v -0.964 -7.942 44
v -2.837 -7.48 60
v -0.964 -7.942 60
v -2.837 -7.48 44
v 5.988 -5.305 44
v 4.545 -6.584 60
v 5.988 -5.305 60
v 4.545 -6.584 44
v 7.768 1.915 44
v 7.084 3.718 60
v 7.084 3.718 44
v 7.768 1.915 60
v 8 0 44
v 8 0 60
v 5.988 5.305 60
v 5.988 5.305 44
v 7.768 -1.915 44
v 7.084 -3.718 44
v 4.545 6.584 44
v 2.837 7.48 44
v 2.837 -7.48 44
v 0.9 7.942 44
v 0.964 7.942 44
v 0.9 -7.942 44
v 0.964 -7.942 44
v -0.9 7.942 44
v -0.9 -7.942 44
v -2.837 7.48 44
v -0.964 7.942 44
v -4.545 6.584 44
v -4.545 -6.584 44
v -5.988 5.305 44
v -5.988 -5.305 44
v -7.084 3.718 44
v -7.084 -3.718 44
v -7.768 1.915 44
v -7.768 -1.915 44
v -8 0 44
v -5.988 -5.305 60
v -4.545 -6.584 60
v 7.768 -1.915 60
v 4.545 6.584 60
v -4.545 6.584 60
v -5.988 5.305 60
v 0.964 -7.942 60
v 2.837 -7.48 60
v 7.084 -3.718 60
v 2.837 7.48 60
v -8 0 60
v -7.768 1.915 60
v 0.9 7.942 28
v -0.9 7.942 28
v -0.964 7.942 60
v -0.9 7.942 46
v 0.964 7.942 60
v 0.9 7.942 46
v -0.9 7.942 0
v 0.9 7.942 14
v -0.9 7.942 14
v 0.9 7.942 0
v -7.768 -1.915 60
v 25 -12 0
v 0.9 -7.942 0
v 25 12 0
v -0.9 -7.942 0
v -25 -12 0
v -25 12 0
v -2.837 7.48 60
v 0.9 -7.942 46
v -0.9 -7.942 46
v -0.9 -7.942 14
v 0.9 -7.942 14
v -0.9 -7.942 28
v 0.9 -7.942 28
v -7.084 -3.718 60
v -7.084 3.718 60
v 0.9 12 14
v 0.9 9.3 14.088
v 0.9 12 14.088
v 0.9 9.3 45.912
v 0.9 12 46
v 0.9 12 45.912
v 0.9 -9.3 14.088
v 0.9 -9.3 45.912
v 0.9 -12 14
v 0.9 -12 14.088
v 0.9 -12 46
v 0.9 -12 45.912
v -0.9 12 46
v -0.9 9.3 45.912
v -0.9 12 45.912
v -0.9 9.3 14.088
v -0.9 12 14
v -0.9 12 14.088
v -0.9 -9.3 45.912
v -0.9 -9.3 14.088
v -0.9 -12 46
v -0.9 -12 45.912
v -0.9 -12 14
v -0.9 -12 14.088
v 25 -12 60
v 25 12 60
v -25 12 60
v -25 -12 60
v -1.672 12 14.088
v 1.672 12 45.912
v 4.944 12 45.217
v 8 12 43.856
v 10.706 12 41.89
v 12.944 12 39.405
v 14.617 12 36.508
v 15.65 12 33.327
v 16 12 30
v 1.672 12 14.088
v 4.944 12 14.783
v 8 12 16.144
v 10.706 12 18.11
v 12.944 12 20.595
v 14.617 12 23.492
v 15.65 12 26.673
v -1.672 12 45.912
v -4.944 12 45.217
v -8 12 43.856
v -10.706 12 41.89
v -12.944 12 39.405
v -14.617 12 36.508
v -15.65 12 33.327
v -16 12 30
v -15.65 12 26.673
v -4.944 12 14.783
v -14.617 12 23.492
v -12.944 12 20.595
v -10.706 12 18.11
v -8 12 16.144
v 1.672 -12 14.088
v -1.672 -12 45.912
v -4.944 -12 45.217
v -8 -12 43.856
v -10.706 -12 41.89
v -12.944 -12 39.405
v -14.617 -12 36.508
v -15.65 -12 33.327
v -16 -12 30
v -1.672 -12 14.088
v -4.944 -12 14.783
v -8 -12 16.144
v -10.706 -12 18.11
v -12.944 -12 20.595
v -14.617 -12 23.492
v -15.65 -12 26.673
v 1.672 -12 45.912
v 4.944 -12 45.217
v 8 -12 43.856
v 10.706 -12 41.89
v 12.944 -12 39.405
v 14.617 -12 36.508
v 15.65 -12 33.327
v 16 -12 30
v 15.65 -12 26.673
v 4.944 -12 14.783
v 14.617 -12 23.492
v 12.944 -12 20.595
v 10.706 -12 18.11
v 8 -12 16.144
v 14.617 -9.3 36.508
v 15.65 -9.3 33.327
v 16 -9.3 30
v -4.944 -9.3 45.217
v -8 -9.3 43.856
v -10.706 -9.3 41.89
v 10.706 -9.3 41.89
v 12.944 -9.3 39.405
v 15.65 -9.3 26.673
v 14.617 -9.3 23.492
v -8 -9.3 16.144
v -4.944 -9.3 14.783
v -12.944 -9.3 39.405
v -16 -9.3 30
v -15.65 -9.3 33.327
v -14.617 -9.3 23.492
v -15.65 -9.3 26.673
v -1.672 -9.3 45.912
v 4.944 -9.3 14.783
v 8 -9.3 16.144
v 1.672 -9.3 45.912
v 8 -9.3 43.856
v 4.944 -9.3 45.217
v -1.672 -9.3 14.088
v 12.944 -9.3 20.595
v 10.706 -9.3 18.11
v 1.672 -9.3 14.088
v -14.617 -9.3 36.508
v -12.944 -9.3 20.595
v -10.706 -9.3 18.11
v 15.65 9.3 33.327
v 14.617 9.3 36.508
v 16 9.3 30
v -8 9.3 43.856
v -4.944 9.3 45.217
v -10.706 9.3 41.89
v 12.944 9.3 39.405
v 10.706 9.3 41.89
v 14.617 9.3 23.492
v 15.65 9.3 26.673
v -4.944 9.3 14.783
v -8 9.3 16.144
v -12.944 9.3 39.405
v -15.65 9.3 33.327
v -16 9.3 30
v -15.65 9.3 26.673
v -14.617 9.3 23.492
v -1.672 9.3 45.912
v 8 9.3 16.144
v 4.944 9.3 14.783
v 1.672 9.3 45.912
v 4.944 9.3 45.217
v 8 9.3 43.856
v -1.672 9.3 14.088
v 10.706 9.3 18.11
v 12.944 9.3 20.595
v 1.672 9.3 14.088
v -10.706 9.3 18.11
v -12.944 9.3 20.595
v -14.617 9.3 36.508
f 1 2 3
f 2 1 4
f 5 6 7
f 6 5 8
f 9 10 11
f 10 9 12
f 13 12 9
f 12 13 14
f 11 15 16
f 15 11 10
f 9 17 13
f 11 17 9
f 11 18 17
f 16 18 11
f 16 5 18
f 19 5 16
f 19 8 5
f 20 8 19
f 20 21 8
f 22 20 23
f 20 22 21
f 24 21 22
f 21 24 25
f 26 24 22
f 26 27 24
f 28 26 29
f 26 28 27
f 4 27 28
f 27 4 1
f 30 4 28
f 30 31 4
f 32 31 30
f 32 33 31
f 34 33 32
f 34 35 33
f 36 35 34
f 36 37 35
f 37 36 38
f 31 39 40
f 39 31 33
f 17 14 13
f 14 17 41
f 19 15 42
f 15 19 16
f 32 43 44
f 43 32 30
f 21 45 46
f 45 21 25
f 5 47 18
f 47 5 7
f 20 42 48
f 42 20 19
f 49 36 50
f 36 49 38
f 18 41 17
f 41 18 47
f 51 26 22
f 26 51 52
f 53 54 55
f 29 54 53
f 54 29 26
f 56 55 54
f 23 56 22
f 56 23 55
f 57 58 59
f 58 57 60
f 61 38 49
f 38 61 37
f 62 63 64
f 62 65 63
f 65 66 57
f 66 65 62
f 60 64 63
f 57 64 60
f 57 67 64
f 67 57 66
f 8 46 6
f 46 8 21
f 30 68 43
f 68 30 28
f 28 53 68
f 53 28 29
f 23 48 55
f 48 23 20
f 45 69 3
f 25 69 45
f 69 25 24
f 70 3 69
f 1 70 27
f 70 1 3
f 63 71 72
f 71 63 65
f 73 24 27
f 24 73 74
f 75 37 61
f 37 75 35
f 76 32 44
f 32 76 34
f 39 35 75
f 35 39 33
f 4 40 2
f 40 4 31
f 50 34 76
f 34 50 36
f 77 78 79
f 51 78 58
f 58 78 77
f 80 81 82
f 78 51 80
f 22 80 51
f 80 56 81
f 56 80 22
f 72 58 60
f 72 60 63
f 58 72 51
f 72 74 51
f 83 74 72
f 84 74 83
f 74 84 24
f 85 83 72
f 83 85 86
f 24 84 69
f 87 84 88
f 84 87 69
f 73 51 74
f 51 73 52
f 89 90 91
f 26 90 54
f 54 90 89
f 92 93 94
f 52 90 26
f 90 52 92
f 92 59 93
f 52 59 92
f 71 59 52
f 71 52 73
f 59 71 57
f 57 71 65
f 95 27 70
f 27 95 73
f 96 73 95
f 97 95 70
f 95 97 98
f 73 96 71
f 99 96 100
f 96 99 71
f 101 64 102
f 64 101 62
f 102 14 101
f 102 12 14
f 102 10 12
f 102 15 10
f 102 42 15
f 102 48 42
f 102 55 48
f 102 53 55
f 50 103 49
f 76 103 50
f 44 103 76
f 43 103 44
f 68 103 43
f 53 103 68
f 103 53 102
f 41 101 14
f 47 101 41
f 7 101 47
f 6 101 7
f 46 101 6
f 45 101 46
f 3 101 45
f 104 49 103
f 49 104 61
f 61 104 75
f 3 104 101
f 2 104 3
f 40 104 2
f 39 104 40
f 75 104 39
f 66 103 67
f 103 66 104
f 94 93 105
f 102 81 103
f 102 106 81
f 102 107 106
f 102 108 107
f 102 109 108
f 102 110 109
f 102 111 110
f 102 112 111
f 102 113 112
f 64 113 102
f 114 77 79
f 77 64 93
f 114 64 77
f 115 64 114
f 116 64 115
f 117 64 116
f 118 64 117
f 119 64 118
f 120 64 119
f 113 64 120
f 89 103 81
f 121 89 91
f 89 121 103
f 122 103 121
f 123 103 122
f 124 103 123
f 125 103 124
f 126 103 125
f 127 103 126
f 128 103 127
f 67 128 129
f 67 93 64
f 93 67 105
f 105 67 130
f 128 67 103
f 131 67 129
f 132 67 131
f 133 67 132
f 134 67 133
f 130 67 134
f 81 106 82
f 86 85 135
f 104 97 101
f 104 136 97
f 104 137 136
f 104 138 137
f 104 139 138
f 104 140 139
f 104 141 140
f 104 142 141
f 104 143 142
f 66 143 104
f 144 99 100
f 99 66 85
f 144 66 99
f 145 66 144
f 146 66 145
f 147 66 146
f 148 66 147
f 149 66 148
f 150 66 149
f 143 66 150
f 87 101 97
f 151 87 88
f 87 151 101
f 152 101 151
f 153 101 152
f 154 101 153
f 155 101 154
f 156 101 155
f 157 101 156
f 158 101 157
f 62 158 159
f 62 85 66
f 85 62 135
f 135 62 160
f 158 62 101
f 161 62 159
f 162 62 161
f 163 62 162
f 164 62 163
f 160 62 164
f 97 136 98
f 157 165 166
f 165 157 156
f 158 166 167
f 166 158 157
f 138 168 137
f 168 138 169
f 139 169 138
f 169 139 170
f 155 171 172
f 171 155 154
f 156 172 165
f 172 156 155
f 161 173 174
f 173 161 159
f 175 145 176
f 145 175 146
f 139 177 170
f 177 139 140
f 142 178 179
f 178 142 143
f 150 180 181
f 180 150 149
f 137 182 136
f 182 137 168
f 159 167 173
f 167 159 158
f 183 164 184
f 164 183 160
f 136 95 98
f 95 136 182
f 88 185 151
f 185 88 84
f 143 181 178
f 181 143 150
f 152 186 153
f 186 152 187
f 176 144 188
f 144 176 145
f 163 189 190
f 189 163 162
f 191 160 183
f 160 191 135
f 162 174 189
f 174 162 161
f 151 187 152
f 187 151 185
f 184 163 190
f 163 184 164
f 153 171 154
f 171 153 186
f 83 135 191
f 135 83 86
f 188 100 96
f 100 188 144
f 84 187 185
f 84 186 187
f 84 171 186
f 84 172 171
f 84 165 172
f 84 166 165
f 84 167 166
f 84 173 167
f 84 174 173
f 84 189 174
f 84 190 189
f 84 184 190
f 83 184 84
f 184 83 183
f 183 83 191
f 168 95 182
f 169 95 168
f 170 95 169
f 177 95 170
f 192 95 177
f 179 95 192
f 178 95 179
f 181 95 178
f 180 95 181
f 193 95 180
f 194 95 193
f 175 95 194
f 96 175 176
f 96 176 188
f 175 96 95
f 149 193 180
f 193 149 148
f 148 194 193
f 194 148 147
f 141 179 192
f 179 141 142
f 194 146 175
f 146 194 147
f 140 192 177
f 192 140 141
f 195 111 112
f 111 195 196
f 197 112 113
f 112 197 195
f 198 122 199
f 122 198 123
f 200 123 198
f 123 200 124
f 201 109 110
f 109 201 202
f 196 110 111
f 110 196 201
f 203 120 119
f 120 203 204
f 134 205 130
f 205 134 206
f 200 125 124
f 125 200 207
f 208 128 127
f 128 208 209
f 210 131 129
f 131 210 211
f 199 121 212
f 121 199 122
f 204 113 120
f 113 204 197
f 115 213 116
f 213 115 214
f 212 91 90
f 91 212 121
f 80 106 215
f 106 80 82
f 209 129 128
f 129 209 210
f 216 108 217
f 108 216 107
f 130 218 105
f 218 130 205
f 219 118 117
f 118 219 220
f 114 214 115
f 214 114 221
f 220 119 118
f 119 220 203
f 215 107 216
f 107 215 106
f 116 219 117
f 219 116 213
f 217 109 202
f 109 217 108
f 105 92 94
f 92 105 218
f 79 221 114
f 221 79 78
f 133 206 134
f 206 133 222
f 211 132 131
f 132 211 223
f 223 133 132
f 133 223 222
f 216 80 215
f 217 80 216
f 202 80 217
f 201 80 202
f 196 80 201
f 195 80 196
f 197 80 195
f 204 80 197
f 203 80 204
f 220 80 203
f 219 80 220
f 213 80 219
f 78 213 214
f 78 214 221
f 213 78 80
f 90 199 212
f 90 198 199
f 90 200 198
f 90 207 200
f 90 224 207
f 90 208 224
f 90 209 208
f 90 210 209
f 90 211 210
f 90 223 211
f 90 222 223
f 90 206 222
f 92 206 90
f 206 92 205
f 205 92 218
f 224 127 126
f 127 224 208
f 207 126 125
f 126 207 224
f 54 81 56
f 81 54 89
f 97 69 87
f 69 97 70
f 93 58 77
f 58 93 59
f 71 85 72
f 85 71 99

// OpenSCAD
/**************************************************
 *             MARBLE PUMP GENERATOR              *
 * a simples Generator to gernerate marble pumps  *
 *                                                *
 *  created by cyberkeiler  (terramultimedia.de)  *
 **************************************************/

/**************************************************
 *            All Settings are below              *
 vvvvvvvvvvvvvvvvvvvvvvvvvvvvvvvvvvvvvvvvvvvvvvvvv*/

// Marble Setup
marble_dia = 16; // The Diameter of your Marbles

//Marble Pump Setup
marblepump_height = 60;
marblepump_shaft_rad = 16;
marblepump_shaft_dia = 1.8;

/* ^^^^^^^^^^^^^^^^^^^^^^^^^^^^^^^^^^^^^^^^^^^^^^ *
 *            All Settings are above              *
 **************************************************
 *      EVERYTHING BELOW IS INTERNAL LOGIC!       *
 * DON'T WORRY ABOUT IT ;) ONLY CHANGE THE ABOVE! *
 **************************************************/


// Piston
color([0,0,1,1])
  MarblePumpPiston();

// Piston Block
color([1,0.3,0,.6])
  MarblePump(_length = 50);

module MarblePumpPiston( h = marblepump_height){
  difference(){
    cylinder(r = marble_dia/2, h = ( h - marble_dia));
    translate([0,0,(h - marble_dia*2)/2])
    cube([marblepump_shaft_dia, marble_dia, h - marble_dia*2], center=true);
  }
}

module MarblePump(_width = marble_dia*1.5, _length, _height = marblepump_height){

  translate([0, 0, marblepump_height/2])
    difference(){
      cube([_length, _width, _height], center = true);
      cylinder(r = marble_dia/2, h = _height*1.5, center=true);
      translate([0,-(_width/2 - marblepump_shaft_dia*0.5),0])
        rotate([90,0,0])
          cylinder(r = marblepump_shaft_rad, h=marblepump_shaft_dia*2, center=true);
      translate([0,(_width/2 - marblepump_shaft_dia*0.5),0])
        rotate([90,0,0])
          cylinder(r = marblepump_shaft_rad, h=marblepump_shaft_dia*2, center=true);
      cube([marblepump_shaft_dia, _width, marblepump_shaft_rad*2], center=true);
    }

}
